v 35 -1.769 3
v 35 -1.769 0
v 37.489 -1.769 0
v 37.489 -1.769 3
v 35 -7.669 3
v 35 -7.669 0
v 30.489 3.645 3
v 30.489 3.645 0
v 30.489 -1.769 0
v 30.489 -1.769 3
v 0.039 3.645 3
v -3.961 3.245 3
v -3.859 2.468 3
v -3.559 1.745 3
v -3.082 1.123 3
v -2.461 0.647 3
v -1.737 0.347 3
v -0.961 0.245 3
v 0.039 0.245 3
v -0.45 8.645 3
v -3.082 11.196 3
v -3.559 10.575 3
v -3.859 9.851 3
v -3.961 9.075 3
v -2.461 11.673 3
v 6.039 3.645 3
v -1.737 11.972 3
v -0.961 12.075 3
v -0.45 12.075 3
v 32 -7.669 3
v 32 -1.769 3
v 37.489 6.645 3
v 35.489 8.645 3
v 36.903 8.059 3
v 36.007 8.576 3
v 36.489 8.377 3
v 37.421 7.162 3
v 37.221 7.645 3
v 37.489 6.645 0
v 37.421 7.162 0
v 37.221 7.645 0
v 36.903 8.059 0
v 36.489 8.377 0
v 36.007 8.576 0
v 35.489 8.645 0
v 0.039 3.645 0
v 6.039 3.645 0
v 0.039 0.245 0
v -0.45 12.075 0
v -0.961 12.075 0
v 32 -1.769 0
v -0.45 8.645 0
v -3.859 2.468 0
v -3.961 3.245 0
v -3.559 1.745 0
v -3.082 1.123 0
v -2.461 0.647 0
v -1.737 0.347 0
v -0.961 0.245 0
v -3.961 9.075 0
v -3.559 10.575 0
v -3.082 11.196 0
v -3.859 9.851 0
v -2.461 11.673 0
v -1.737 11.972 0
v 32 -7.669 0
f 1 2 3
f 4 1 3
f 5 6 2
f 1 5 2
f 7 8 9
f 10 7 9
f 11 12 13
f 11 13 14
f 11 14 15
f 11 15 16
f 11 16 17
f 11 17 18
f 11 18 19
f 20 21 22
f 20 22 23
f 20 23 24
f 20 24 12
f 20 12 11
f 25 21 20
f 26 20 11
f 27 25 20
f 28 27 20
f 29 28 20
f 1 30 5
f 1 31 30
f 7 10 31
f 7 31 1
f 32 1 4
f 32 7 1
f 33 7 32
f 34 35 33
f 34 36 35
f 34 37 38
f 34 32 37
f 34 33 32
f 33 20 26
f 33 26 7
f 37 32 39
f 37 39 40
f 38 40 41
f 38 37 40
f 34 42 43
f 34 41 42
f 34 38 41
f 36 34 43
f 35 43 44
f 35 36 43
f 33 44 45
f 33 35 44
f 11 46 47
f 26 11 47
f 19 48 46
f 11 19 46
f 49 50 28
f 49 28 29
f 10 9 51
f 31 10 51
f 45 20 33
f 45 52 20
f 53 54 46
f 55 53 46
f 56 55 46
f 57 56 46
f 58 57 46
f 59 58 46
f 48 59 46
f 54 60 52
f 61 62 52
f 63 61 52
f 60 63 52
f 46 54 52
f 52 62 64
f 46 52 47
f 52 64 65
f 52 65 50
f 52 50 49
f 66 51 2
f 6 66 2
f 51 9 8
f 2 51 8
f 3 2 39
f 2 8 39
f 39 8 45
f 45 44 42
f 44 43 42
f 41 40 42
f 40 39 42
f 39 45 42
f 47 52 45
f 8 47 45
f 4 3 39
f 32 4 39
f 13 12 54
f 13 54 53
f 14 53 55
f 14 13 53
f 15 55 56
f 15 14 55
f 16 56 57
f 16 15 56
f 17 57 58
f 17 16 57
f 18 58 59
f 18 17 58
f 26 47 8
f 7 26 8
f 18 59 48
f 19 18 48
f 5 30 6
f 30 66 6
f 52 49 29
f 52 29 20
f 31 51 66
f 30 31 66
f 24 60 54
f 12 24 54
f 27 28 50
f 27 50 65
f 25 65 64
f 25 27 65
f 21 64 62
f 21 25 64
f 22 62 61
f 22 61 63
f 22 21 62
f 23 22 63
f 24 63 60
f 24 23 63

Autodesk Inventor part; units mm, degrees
ref_plane "YZ Plane" through (0, 0, 0) normal (1, 0, 0) x (0, 1, 0)
ref_plane "XZ Plane" through (0, 0, 0) normal (0, 1, 0) x (-1, 0, 0)
ref_plane "XY Plane" through (0, 0, 0) normal (0, 0, 1) x (1, 0, 0)
sketch "Sketch1" plane through (0, 0, 0) normal (0, 0, 1) x (1, 0, 0)
  line L0 (0.039, 0.2446) -> (0.039, 3.6446)
  line L1 (-3.961, 12.0746) -> (-3.961, 0.2446)
  line L2 (-3.961, 0.2446) -> (0.039, 0.2446)
  line L3 (6.039, 3.6446) -> (30.489, 3.6446)
  line L4 (-3.961, 12.0746) -> (-0.45, 12.0746)
  line L5 (-0.45, 12.0746) -> (-0.45, 8.6446)
  line L6 (0.039, 3.6446) -> (6.039, 3.6446)
  line L7 (-0.45, 8.6446) -> (37.489, 8.6446)
  line L8 (30.489, 3.6446) -> (30.489, -1.7694)
  line L9 (37.489, -1.7694) -> (37.489, 8.6446)
  line L10 (30.489, -1.7694) -> (32, -1.7694)
  line L11 (32, -1.7694) -> (32, -7.6694)
  line L12 (32, -7.6694) -> (35, -7.6694)
  line L13 (35, -7.6694) -> (35, -1.7694)
  line L14 (35, -1.7694) -> (37.489, -1.7694)
  dimension "d0" = 6
  dimension "d10" = 4
  dimension "d22" = 3.4
  dimension "d23" = 3.43
  dimension "d24" = 5
  dimension "d25" = 24.45
  dimension "d26" = 7
  dimension "d31" = 5.9
  dimension "d32" = 3
  dimension "d33" = 1.511
  dimension "d36" = 5.414
extrude "Extrusion1" add sketch "Sketch1" along normal blind 3
fillet "Fillet5" radius 2 1 edges at (37.489, 8.6446, 1.5)
fillet "Fillet6" radius 3 2 edges at (-3.961, 12.0746, 1.5) (-3.961, 0.2446, 1.5)
properties part number "Gripper V 8.0 servo bracket side left 3mm"
